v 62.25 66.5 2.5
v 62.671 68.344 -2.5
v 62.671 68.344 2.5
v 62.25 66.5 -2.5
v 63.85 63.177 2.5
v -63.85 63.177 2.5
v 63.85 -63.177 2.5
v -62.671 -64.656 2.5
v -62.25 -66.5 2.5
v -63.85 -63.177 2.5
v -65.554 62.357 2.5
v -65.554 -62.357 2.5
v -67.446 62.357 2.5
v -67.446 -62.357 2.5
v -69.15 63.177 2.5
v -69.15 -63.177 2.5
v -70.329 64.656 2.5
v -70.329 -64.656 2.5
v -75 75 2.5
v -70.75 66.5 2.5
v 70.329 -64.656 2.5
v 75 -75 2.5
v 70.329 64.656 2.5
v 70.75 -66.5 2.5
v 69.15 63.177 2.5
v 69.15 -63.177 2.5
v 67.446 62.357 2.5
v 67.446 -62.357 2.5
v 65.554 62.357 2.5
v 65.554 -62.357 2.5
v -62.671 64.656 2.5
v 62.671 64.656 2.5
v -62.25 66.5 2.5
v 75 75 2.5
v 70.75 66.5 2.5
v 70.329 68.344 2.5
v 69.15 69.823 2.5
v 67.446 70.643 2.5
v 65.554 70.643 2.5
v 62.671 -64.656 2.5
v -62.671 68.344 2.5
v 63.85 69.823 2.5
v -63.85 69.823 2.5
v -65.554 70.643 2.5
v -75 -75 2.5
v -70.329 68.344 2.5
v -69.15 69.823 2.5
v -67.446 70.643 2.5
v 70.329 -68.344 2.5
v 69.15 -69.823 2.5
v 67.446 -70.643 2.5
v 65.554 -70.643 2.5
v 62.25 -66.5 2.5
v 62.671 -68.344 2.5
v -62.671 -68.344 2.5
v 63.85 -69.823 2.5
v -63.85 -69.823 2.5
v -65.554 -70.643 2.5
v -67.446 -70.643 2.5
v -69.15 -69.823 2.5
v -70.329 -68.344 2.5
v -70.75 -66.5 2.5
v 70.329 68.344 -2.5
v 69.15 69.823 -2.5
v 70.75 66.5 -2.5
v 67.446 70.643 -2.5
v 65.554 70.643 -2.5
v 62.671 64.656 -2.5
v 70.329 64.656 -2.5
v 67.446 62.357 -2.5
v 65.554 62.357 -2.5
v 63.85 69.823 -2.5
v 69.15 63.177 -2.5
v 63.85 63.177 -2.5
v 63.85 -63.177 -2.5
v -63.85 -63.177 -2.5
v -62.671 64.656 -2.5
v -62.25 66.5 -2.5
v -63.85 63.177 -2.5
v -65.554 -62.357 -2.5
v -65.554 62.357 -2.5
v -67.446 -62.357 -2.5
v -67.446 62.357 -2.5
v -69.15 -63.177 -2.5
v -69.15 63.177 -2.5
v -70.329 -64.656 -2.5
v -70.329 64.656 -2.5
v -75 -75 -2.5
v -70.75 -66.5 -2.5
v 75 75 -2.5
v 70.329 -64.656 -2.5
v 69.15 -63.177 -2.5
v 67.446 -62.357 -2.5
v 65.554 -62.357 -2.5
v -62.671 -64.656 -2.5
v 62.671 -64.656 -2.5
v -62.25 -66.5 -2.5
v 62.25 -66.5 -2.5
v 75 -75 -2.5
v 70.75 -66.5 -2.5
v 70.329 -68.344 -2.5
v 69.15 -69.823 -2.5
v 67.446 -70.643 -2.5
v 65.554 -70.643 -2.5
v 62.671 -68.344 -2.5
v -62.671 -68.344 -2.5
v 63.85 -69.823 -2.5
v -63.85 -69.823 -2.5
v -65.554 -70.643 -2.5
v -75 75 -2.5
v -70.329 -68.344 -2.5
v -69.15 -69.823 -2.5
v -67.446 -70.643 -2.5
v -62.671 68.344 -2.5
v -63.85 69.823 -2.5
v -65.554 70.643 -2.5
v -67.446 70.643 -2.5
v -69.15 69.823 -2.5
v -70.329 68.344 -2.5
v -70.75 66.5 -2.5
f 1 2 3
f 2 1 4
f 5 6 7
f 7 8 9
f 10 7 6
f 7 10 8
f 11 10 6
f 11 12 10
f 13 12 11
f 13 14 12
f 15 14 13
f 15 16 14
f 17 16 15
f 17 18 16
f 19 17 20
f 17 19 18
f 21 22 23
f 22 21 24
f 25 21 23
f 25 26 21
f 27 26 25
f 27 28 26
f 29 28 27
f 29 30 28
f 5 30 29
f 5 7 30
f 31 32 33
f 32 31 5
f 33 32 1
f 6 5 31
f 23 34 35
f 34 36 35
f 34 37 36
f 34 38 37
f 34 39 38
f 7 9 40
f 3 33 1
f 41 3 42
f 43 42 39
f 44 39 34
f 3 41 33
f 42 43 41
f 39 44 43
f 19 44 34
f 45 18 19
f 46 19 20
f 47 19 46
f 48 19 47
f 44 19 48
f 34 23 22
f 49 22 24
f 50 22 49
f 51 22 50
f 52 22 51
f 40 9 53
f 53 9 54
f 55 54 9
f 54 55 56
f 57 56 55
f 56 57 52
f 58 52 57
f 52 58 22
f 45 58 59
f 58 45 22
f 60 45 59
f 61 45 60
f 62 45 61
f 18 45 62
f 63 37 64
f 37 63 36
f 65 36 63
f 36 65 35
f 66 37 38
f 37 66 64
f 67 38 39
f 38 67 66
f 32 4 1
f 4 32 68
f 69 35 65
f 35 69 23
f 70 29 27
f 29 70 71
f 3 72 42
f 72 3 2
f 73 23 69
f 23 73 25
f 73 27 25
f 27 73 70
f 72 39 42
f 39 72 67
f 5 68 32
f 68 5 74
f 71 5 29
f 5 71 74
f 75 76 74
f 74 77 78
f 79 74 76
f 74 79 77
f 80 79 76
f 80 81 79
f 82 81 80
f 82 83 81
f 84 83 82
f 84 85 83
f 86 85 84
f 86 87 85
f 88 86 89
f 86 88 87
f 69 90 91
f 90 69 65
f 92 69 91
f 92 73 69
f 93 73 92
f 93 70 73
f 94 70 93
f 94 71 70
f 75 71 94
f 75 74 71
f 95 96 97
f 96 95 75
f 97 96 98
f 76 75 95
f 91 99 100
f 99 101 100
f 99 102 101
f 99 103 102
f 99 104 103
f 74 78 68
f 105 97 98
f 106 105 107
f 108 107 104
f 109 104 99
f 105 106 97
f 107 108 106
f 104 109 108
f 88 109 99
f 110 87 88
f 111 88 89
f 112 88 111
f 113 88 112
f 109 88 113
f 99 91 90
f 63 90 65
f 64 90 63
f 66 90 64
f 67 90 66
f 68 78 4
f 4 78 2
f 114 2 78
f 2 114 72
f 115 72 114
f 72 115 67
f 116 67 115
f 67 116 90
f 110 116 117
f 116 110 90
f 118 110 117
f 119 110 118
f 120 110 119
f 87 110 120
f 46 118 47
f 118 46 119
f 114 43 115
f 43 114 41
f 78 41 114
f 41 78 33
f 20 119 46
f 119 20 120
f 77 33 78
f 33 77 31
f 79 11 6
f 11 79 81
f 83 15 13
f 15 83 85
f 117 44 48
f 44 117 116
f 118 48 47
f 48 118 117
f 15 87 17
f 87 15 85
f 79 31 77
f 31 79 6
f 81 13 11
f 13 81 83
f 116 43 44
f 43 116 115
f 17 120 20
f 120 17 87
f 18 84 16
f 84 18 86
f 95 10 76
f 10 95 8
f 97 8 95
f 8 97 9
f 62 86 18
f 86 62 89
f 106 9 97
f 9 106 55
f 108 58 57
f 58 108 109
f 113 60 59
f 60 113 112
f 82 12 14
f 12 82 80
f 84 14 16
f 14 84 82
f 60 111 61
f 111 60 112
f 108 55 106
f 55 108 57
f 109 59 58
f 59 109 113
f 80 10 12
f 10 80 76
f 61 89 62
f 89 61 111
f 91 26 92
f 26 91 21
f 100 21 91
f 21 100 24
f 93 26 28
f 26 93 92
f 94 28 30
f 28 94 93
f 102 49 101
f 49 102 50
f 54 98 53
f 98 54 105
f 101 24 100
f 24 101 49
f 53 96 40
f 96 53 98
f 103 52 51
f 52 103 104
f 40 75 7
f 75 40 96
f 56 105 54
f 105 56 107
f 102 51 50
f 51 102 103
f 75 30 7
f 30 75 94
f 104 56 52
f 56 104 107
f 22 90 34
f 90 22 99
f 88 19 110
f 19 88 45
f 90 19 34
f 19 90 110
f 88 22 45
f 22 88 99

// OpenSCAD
// Generated by SolidPython 1.1.3 on 2023-12-20 14:17:19


difference() {
	cube(center = true, size = [150, 150, 5]);
	union() {
		translate(v = [66.5000000000, 66.5000000000]) {
			cylinder(center = true, h = 5, r = 4.2500000000);
		}
		translate(v = [-66.5000000000, 66.5000000000]) {
			cylinder(center = true, h = 5, r = 4.2500000000);
		}
		translate(v = [-66.5000000000, -66.5000000000]) {
			cylinder(center = true, h = 5, r = 4.2500000000);
		}
		translate(v = [66.5000000000, -66.5000000000]) {
			cylinder(center = true, h = 5, r = 4.2500000000);
		}
	}
}
/***********************************************
*********      SolidPython code:      **********
************************************************
 
import solid
import numpy as np
import numbers
import pudb
from solid.utils import *
import viewscad
import subprocess
import os
import os.path as osp
import math
import sys

chamfer_extrude=solid.import_scad("./chamfer_extrude.scad")
chamfer_extrude=chamfer_extrude.chamfer_extrude
r = viewscad.Renderer(width=800, height=800)

def debug(model,f_name,path="/home/ts/code/projects/mfd/designs/debug"):
    solid.scad_render_to_file(model,osp.join(path,f_name)+".scad")
#generate position list of wells using offset from center
wells_pos_from_center_4 = lambda offset: [[-offset,offset],
                                        [offset, offset],
                                        [-offset, -offset],
                                        [offset, -offset]]
#wells_pos_from_center_2 = lambda offset: [[0,offset],
#                                        [0, -offset]]
wells_pos_from_center_2 = lambda offset: [[offset,0],
                                        [-offset,0]]

def make_well(dims,shape=None,height=None,dxf=False):
    def circle_cylinder():
        if dxf or (height is None):
            well = solid.circle(r=dims, segments=64)
        else:
            well = solid.cylinder(r=dims, h=height, segments=64, center = True)
        return well
    if dims is None:
        sys.exit("radius needs to be a number")
    if isinstance(dims, numbers.Number):
        well =circle_cylinder()
    elif len(dims)==1:
        if isinstance(dims[1], numbers.Number):
            well =circle_cylinder()
        else:
            sys.exit("radius needs to be a number")
    elif len(dims)==2:
        well = solid.square(dims,center = True)
    elif len(dims)==3:
        well = solid.cube(dims, center = True)
    return well

def wells_top_bottom(center_gap,device_dims=None,shape=None,height=None, positions = None, dxf = False,well_shape=None):
    if well_shape == None:
        well_shape = make_well(device_dims,shape=shape,height=height,dxf=dxf)
    wells = []
    if positions is None:
        offset = radius+radius/2.0
        positions = wells_pos_from_center_2(offset)
    if dxf or (height is None):
        height = 0
    for position in positions:
        if dxf:
            wells.append(solid.translate([position[0],position[1]])(well_shape))
        else:
            wells.append(solid.translate([position[0],position[1],height/2.0])(well_shape))
    return  union()(*wells)

#place wells in four corners 
def four_corner(radius,height=None, positions = None, dxf = False):
    #if well pos not specified set
    #to equally spaced by half radius
    if positions is None:
        offset = radius+radius/2.0
        positions = wells_pos_from_center_4(offset)
    if dxf or (height is None):
        height = 0
    #make wells at positions with specified radius and height
    wells = []
    for position in positions:
        #make circle if making dxf
        if dxf:
            well_shape = solid.circle(r=radius, segments=64)
            well_shape = solid.translate([position[0],position[1]])(well_shape)
        #if stl make cylinder
        else:
            well_shape = solid.cylinder(r=radius, h=height, segments=64, center = True)
            well_shape = solid.translate([position[0],position[1],height/2.0])(well_shape)
        wells.append(well_shape)
    return  union()(*wells)

#generate channels 
def make_channels(length,width,height=0,num_chans=1,max_chans=None,spacing=None, dxf = False,
                  rotate_channels=False):
    if dxf or (height is None):
        height = 0
    #if channel gap not defined, is equal to
    if spacing is None: spacing = width
    #calculate number of channels if fitting max num within given width
    if not max_chans is None:
        import math
        num_chans = math.floor((max_chans-spacing)/(width+spacing))
    #get total width of channel section  
    total_width = (width*num_chans)+(spacing*(num_chans-1))

    #make template channel
    #if rotate_channels: width, length = length, width
    if dxf:
        channel_t = solid.square([length,width],center = True)
    else:
        channel_t = solid.cube([length,width,height], center = True)

    #if number channels is even, offset the first channel to center its gap
    if num_chans % 2 == 0: centering = -(width/2.0+spacing/2.0)
    else: centering = 0
    #move template channel up to align bottom at z = 0 
    #and offset center if necessary
    if dxf:
        channel_t = solid.translate([0,centering])(channel_t)
    else:
        channel_t = solid.translate([0,centering,height/2.0])(channel_t)

    #if rotate_channels: length,width = width,length
    #start making the channels
    channels = []
    for i in range(num_chans):
        #if i=0 there is no translation
        #if i=1, we make the first channel adjacent to second
        direction = i

        #if i>=1, we add channels alternating left and right
        if i >= 1:
            direction = -(i/2.0)
            if i % 2 == 1: direction = (-direction)+0.5
                
        #make channel at right position and add it to channel list
        translation_coords = [0,direction*(width+spacing)]
        #if rotate_channels: translation_coords = [direction*(width+spacing),0]
        if dxf:
            channel = solid.translate(translation_coords)(channel_t)
        else:
            channel = solid.translate([*translation_coords,0])(channel_t)
        channels.append(channel)
    
    #group all channels as one object
    channels = union()(*channels)
    #compute the x,y,z dimensions in order to pass as arguments 
    #for construction of other parts of device (such as the chambers)
    measurements = {'x':(length/2.0,-length/2.0),
                    'y':(total_width/2.0,-total_width/2.0)}
    if not dxf:
        measurements['z'] = (height,0)
    if rotate_channels:
        channels = solid.rotate(90)(channels)
        measurements['x'],measurements['y']=measurements['y'],measurements['x']
    return channels,measurements

def make_chambers(msrs,height=None,extra=0,len_until=None,width=None, dxf = False):
    #computes x,y,z length
    total = lambda x : abs(x[0]) + abs(x[1])
    
    #if specific height if specified
    #otherwise use same height as channels
    if dxf:
        pass
    elif not height is None:
        msrs['z'] = (height,0)
    else:
        msrs['z'] = (0,0)
        
    #make copy of measurements from channels to modify chamber dimensions 
    #and add length to chambers as specified
    chamber_dims = msrs.copy()
    #calculate length of chamber to reach specified offset
    if not len_until is None:
        chamber_len = len_until-(msrs['x'][0])
    #or add specified length to channel length (if not specified, adds 0)
    else:
        chamber_len = msrs['x'][0]+extra
    #set the chamber length based 
    chamber_dims['x'] = (chamber_len/2.0,-(chamber_len/2.0))
    #compute final dimensions of chamber
    if not width is None:
        chamber_dims['y'] = (width/2.0,-width/2.0)
    chamber_dims = [total(size) for size in chamber_dims.values()]
        
    #calculate chamber translation offset to place adjacent to channels
    chamber_trslt = msrs['x'][0]+(chamber_len/2.0)
    #compute chamber translation coordinates to align with channels
    #x = 1 moves chamber above channels
    #x = -1 moves chamber below channels
    if dxf:
        trslt = lambda x : [x*(chamber_trslt),0]
    else:
        trslt = lambda x : [x*(chamber_trslt),0,msrs['z'][0]/2.0]
    
    #function to make chamber at top or at bottom 
    if dxf:
        move = lambda x : solid.translate(trslt(x))(solid.square(chamber_dims, center = True) )
    else:
        move = lambda x : solid.translate(trslt(x))(solid.cube(chamber_dims,center = True))
    #make top and bottom chambers and return them as grouped
    top = move(1)
    bottom = move(-1)
    #chambers=solid.rotate(90)(solid.union()(top,bottom))
    chambers=(solid.union()(top,bottom))

    return chambers

#create alignment features 
def alignment_features(unit,dims,grid_size, mask_size = None, alignment = "hollow", units_from_center = (2.5,2.5), corner_len=None):
    width = grid_size[0]*dims[0]
    length = grid_size[1]*dims[1]
    if mask_size is None and corner_len is None:
        corner_len = (dims[0] + dims[1]) /2 / 8
    corner = lambda thickness_div : solid.union()( solid.square([corner_len,corner_len/thickness_div],center=False), solid.square([corner_len/thickness_div,corner_len],center=False) )
    
    def make_full(thickness_div):
        thickness = corner_len/thickness_div
        tr = solid.translate([0, 0, 0 ])(solid.rotate(180)(corner(thickness_div)))
        tr = solid.translate([thickness/2,thickness/2,0])(tr)
        bl = solid.translate([0, 0, 0 ])(solid.rotate(0)(corner(thickness_div)))
        bl = solid.translate([-thickness/2,-thickness/2,0])(bl)
        return solid.union()(tr,bl)
    
    def make_hollow(thickness_div):
        thickness = corner_len/(thickness_div/2)
        inner = make_full(thickness_div)
        outer = make_full(thickness_div/2)
        hollow = outer - inner 
        return hollow
    
    center = (width /2 , length/2)
    mask_pos = lambda x,y : (center[0] + x*(float(units_from_center[0])*dims[0]), center[1] + y*(float(units_from_center[1])*dims[1]))
    positions = []
    positions.append(mask_pos(1,0))
    positions.append(mask_pos(0,1))
    positions.append(mask_pos(-1,0))
    positions.append(mask_pos(0,-1))
    make_mask = lambda mtype : make_hollow(8) if mtype == "hollow" else make_full(8)
    masks = [ solid.translate([*position,0])(make_mask(alignment)) for position in positions]
    
    solid.scad_render_to_file(solid.union()(*masks),"./designs/open_chamber/masks.scad")
    #return unit - solid.union()(*masks)
    return solid.union()(*masks,unit)

def create_outline(thickness, array, dims, grid_size,):
    width = grid_size[0]*dims[0] + thickness *2
    length = grid_size[1]*dims[1] + thickness *2
    outer = solid.translate([-thickness, -thickness,0])(solid.square([width, length]))
    return outer-array

def create_wall(wall_thickness, outline_thickness, dims, grid_size, wall_height = 2000, dxf = False):
    inner_width = grid_size[0]*dims[0] + outline_thickness *2
    inner_length = grid_size[1]*dims[1] + outline_thickness *2
    outer_width = inner_width + wall_thickness * 2
    outer_length = inner_length + wall_thickness * 2
    outer_pos_x = -outline_thickness-wall_thickness
    outer_pos_y = -outline_thickness-wall_thickness
    inner_pos_x = -outline_thickness
    inner_pos_y = -outline_thickness
    if dxf:
        inner_wall = solid.translate([inner_pos_x,
                                      inner_pos_y,
                                      0])(solid.square([inner_width, inner_length]))
        outer_wall = solid.translate([outer_pos_x,
                                      outer_pos_y,
                                      0])(solid.square([outer_width, outer_length]))

        return outer_wall-inner_wall
    else:
        inner_wall = solid.translate([inner_pos_x,
                                      inner_pos_y,
                                      0])(solid.cube([inner_width, inner_length,wall_height]))
        outer_wall = solid.translate([outer_pos_x,
                                      outer_pos_y,
                                      0])(solid.cube([outer_width, outer_length,wall_height]))

        return outer_wall-inner_wall, {'wall_height': wall_height,
                                       'wall_thickness': wall_thickness,
                                       'inner_width':inner_width,
                                       'inner_length': inner_length,
                                       'outer_width': outer_width,
                                       'outer_length': outer_length,
                                       'outer_pos_x' : outer_pos_x,
                                       'outer_pos_y' : outer_pos_y,
                                       'inner_pos_x' : inner_pos_x,
                                       'inner_pos_y' : inner_pos_y}

def create_thicker_wall(wall_thickness, outer_wall_offset, wall_dims, dims, grid_size, height_start = .2, height_end=2, dxf = False):
    addon_wall,thicker_wall_dims = create_wall(wall_thickness, outer_wall_offset, dims, grid_size, wall_height=height_end-height_start, dxf = False)
    addon_wall = solid.translate([0,0,height_start])(addon_wall)

    thicker_wall_dims['wall_height'] = height_end
    thicker_wall_dims['wall_thickness'] = wall_dims['wall_thickness'] + wall_thickness
    return addon_wall, thicker_wall_dims
 
def add_lock_to_wall(wall,wall_dims,y_offset = 0,cut_ratio=0.7,L_length=3, gap_ratio=0.05, axis="x",width_ratio=1/2):
    # Makes L shape
    def make_L(max_length,length_thickness,max_width,width_thickness,height,y_offset):
        length = solid.cube([max_length,length_thickness,height])
        width = solid.cube([width_thickness,max_width,height])
        width = solid.translate([max_length-(width_thickness),0,0])(width)
        L = solid.union()(width,length)
        debug(L,"L")
        if axis == "x":
            L = solid.rotate(-90)(L)
            L = solid.translate([0,max_length,0])(L)
        else:
            L = solid.rotate(-180)(L)
            L = solid.translate([max_length,max_width,0])(L)
        return solid.translate([0,0,y_offset])(L)
    
    lock_length = L_length
    lock_width = wall_dims['wall_thickness']*width_ratio
    lock_length_thickness = lock_width/2
    lock_width_thickness = lock_width/2
    L_lock = make_L(lock_length,lock_length_thickness,lock_width,lock_width_thickness, wall_dims['wall_height']-y_offset, y_offset)
    
    margin_space = lock_length - lock_length*(1-gap_ratio)
    key_length = lock_length-margin_space
    key_length_thickness = lock_length_thickness-(margin_space*2)
    key_width = lock_width-(margin_space*2)
    key_width_thickness = lock_width_thickness-(margin_space*2)
    L_key = make_L(key_length,key_length_thickness,key_width,key_width_thickness, wall_dims['wall_height']-y_offset, y_offset)
    L_key = solid.translate([margin_space,margin_space,0])(L_key)
    L = solid.union()(L_lock,L_key)
    debug(L,"L")
    
    #Make cube to be used as negative to split frame in a half
    #Can choose if making left or right negative, specify ratio of split
    def make_negative(right,cut_ratio):
        if axis == "x":
            if right:
                length = wall_dims['outer_length']*(1-cut_ratio)
                pos_x = wall_dims['outer_pos_x']+(wall_dims['outer_length']*cut_ratio)
            else:
                length = wall_dims['outer_length']*(cut_ratio)
                pos_x = wall_dims['outer_pos_x'] 
            negative = solid.cube([wall_dims['outer_width'],length, wall_dims['wall_height']])
            negative = solid.translate([wall_dims['outer_pos_y'],pos_x,0])(negative)
        else:
            if right:
                length = wall_dims['outer_width']*(1-cut_ratio)
                pos_x = wall_dims['outer_pos_y']+(wall_dims['outer_width']*cut_ratio)
            else:
                length = wall_dims['outer_width']*(cut_ratio)
                pos_x = wall_dims['outer_pos_y'] 
            negative = solid.cube([length,wall_dims['outer_length'], wall_dims['wall_height']])
            negative = solid.translate([pos_x,wall_dims['outer_pos_x'],0])(negative)
        return negative, pos_x, length 
                      
    #Make negatives
    negative_right, right_half_pos_x, right_half_length = make_negative(True,cut_ratio)
    negative_left, left_half_pos_x, right_half_length = make_negative(False,cut_ratio)
    #Make halves
    left_half = solid.difference()(wall,negative_right)
    right_half = solid.difference()(wall,negative_left)
    def place_L(L, L_length,L_width):
        #Place L on top wall       
        offset_to_center = (wall_dims['wall_thickness']-L_width)/2
        if axis == "x":
            y_pos_top = (wall_dims['outer_pos_y'] +
                    wall_dims['outer_width'] - 
                    L_width - offset_to_center)
            top_L = solid.translate([y_pos_top,
                                     right_half_pos_x-(L_length),
                                     0])(L)
            #Place L on bottom wall       
            y_pos_bottom = wall_dims['outer_pos_y']+offset_to_center
            bottom_L = solid.translate([y_pos_bottom,
                                        right_half_pos_x-L_length,
                                        0])(L)
        else:
            y_pos_top = (wall_dims['outer_pos_x'] +
                    wall_dims['outer_length'] -
                    (L_width+offset_to_center))
            top_L = solid.translate([right_half_pos_x-L_length,
                                     y_pos_top,
                                     0])(L)
            #Place L on bottom wall       
            y_pos_bottom = wall_dims['outer_pos_y']+offset_to_center
            bottom_L = solid.translate([right_half_pos_x-L_length,
                                        y_pos_bottom,
                                        0])(L)
        return bottom_L, top_L
    #Make complimentary L pieces through union and differences
    #Make Lock
    bottom_L_lock, top_L_lock = place_L(L_lock,L_length,lock_width)
    left_half = solid.difference()(left_half,bottom_L_lock)
    left_half = solid.difference()(left_half,top_L_lock)
    #Make Key
    bottom_L_key, top_L_key = place_L(L_key,L_length,lock_width)
    right_half = solid.union()(right_half,bottom_L_key)
    right_half = solid.union()(right_half,top_L_key)
    return left_half, right_half


#build a row x col grid of containment units
def make_unit_array(unit,dims,grid_size, dxf = False, alignment = None, mask_size = None,
                    units_from_center = None,alignment_offset=None, alignment_mark_size=1):
    units = []
    for col in range(grid_size[1]):
        for row in range(grid_size[0]):
            if dxf:
                units.append(solid.translate([row*dims[0],col*dims[1]])(unit))
            else:
                units.append(solid.translate([row*dims[0],col*dims[1],dims[2]/2.0])(unit))
    array = solid.union()(*units)
    if (not alignment is None) and dxf:
        if not alignment_offset is None:
            array = solid.translate([alignment_offset[0],alignment_offset[1]])(array)
        array = alignment_features(array,dims, grid_size, alignment = alignment, mask_size = None, units_from_center = units_from_center,corner_len=alignment_mark_size)
        if not alignment_offset is None:
            array = solid.translate([-alignment_offset[0],-alignment_offset[1]])(array)
    return array


def make_taylor(wells_pos = wells_pos_from_center_4(2.25), well_rad = 1.5 ,
                well_height = 2, chan_w = 0.01, chan_l = 1, chan_h = 0.010 ,
                chan_gap = 0.040, max_chans = None,num_chans=100, chamber_height  = 0.100,
                columns = 1, rows = 1, chamber_len_until=2.25, add_channels = True, add_wells = True, 
                add_chambers = True, save_path = "./", alignment = None, units_from_center = 2,
                mask_size = None, render_stl = False, outline_thickness = 0.050, dxf = True,
                wall_height = 15, wall_thickness = 0.95, casing_x=9, casing_y=9, casing_z=0,rotate_units=0):

    dims = [casing_x, casing_y, casing_z]
    wells = four_corner(well_rad,well_height, dxf = dxf, positions = wells_pos)
    debug(wells,"wells")
    channels, msrs = make_channels(chan_l,chan_w,chan_h,dxf=dxf, spacing = chan_gap, max_chans=max_chans,num_chans=num_chans)
    debug(channels,"channels")
    chambers = make_chambers(msrs,dxf = dxf, height=chamber_height,len_until=chamber_len_until)
    debug(chambers,"chambers")

    #add together and render
    device_parts = []
    if add_channels:
        device_parts.append(channels)
    if add_wells:
        device_parts.append(wells)
    if add_chambers:
        device_parts.append(chambers)
    device=union()(*device_parts)
    device = rotate(rotate_units)(device)

    device=solid.translate([dims[0]/2.0,dims[1]/2.0,0])(device)
    channels = rotate(rotate_units)(channels)
    channels=solid.translate([dims[0]/2,dims[1]/2,0])(channels)
    chambers_wells = union()(wells,chambers)
    chambers_wells = rotate(rotate_units)(chambers_wells)
    chambers_wells=solid.translate([dims[0]/2,dims[1]/2,0])(chambers_wells)

    file_name = str(rows)+'x'+str(columns)+'_units_'
    grid_size = [rows,columns]

    if alignment:
        alignment="full"
    device = make_unit_array(device,dims,grid_size, dxf=dxf, alignment = alignment,
                                 units_from_center = units_from_center)
    channels = make_unit_array(channels,dims,grid_size, dxf=dxf, alignment = alignment,
                                 units_from_center = units_from_center)
    if alignment=="full":
        alignment="hollow"

    chambers_wells = make_unit_array(chambers_wells,dims,grid_size, dxf=dxf, alignment = alignment,
                                 units_from_center =units_from_center)

    def save_model(model,prefix):
        model_fname = os.path.abspath(save_path+prefix+"_"+file_name+".scad")
        solid.scad_render_to_file(model,model_fname)
        return model_fname

    wells_fname = save_model(wells,"wells")
    channels_fname = save_model(channels,"channels")
    device_fname = save_model(device,"device")
    chambers_wells_fname = save_model(chambers_wells,"chambers_wells")
    return (chambers_wells,chambers_wells_fname), (channels,channels_fname), (device,device_fname)

def make_device(design='open',rows=8,columns=6,wells_pos = 4.5,well_offset=3.2, well_rad=3.2,well_height=0.1,
                chan_l=1,chan_w=0.01,chan_h=0.01,chan_gap=0.015,num_chans=101,dxf=True,save_path="./designs/open_chamber/",
                casing_x=9.0,casing_y=18.0,casing_z=0,rotate_units=90,units_from_center=(3,1),chamber_len_until=4.5,
                chamber_width=None,alignment=True, add_wells=True, add_channels=True,add_chambers=True,well_shape=None):

    dims = [casing_x, casing_y, casing_z]
    if design == "open":
        wells_pos=wells_pos_from_center_2(wells_pos)
        wells = wells_top_bottom(well_offset*2,device_dims=well_rad,height=well_height, dxf = dxf, positions = wells_pos,well_shape=well_shape)
    elif design == "closed":
        wells_pos=wells_pos_from_center_4(wells_pos)
        debug(wells,"wells")
        wells = four_corner(well_offset,well_height,device_dims=well_rad, dxf = dxf, positions = wells_pos)
    else:
        print(design+" is not a valid design.\n Choose valid design: 'open' or 'closed'")
        exit()
    wells = rotate(rotate_units)(wells)
    wells=solid.translate([dims[0]/2,dims[1]/2,0])(wells)
    debug(wells,"wells")

    channels, msrs = make_channels(chan_l,chan_w,chan_h,dxf=dxf, spacing = chan_gap, num_chans=num_chans,rotate_channels=False)
    channels = rotate(rotate_units)(channels)
    channels=solid.translate([dims[0]/2,dims[1]/2,0])(channels)

    chambers=make_chambers(msrs,height=None,extra=0,len_until=chamber_len_until, width=chamber_width,dxf = dxf)
    chambers = rotate(rotate_units)(chambers)
    chambers=solid.translate([dims[0]/2,dims[1]/2,0])(chambers)

    device_parts = []
    if add_channels:
        device_parts.append(channels)
    if add_wells:
        device_parts.append(wells)
    if add_chambers:
        device_parts.append(chambers)
    device = union()(*device_parts)
    #device = rotate(rotate_units)(device)
    #device=solid.translate([dims[0]/2.0,dims[1]/2.0,0])(device)

    chambers_wells = []
    if add_chambers:
        chambers_wells.append(chambers)
    if add_wells:
        chambers_wells.append(wells)
    chambers_wells = union()(*chambers_wells)
    #chambers_wells = union()(wells,chambers)
    #chambers_wells = rotate(rotate_units)(chambers_wells)
    #chambers_wells=solid.translate([dims[0]/2,dims[1]/2,0])(chambers_wells)

    file_name = str(rows)+'x'+str(columns)+'_units_'

    grid_size = [rows,columns]
    if alignment:
        alignment="full"
    device = make_unit_array(device,dims,grid_size, dxf=dxf, alignment = alignment,
                                 units_from_center = units_from_center)
    channels = make_unit_array(channels,dims,grid_size, dxf=dxf, alignment = alignment,
                                 units_from_center = units_from_center)
    if alignment=="full":
        alignment="hollow"

    chambers_wells = make_unit_array(chambers_wells,dims,grid_size, dxf=dxf, alignment = alignment,
                                 units_from_center =units_from_center)

    def save_model(model,prefix):
        model_fname = os.path.abspath(save_path+prefix+"_"+file_name+".scad")
        solid.scad_render_to_file(model,model_fname)
        return model_fname

    wells_fname = save_model(wells,"wells")
    channels_fname = save_model(channels,"channels")
    device_fname = save_model(device,"device")
    chambers_wells_fname = save_model(chambers_wells,"chambers_wells")
    return (chambers_wells,chambers_wells_fname), (channels,channels_fname), (device,device_fname)


def make_open_chamber(rows=8,columns=6,wells_pos = wells_pos_from_center_2(4.5), well_rad=3.2,well_height=0.1,
                      chan_l=1,chan_w=0.01,chan_h=0.01,chan_gap=0.015,num_chans=101,dxf=True,save_path="./designs/open_chamber/",
                      casing_x=9.0,casing_y=18.0,casing_z=0,rotate_units=90,units_from_center=(3,1),chamber_len_until=4.5,
                      chamber_width=None,alignment=True, add_wells=True, add_channels=True,add_chambers=True,well_shape=None):

    dims = [casing_x, casing_y, casing_z]
    wells = wells_top_bottom(well_rad,height=well_height, dxf = dxf, positions = wells_pos, well_shape=well_shape)
    channels, msrs = make_channels(chan_l,chan_w,chan_h,dxf=dxf, spacing = chan_gap, num_chans=num_chans,rotate_channels=False)
    chambers=make_chambers(msrs,height=None,extra=0,len_until=chamber_len_until, width=chamber_width,dxf = dxf)
    debug(chambers,"chambers")
    device_parts = []
    if add_channels:
        device_parts.append(channels)
    if add_wells:
        device_parts.append(wells)
    if add_chambers:
        device_parts.append(chambers)
    device = union()(*device_parts)
    device = rotate(rotate_units)(device)
    device=solid.translate([dims[0]/2.0,dims[1]/2.0,0])(device)
    channels = rotate(rotate_units)(channels)
    channels=solid.translate([dims[0]/2,dims[1]/2,0])(channels)
    chambers_wells = union()(wells,chambers)
    chambers_wells = rotate(rotate_units)(chambers_wells)
    chambers_wells=solid.translate([dims[0]/2,dims[1]/2,0])(chambers_wells)

    file_name = str(rows)+'x'+str(columns)+'_units_'

    grid_size = [rows,columns]
    if alignment:
        alignment="full"
    device = make_unit_array(device,dims,grid_size, dxf=dxf, alignment = alignment,
                                 units_from_center = units_from_center)
    channels = make_unit_array(channels,dims,grid_size, dxf=dxf, alignment = alignment,
                                 units_from_center = units_from_center)
    if alignment=="full":
        alignment="hollow"

    chambers_wells = make_unit_array(chambers_wells,dims,grid_size, dxf=dxf, alignment = alignment,
                                 units_from_center =units_from_center)

    def save_model(model,prefix):
        model_fname = os.path.abspath(save_path+prefix+"_"+file_name+".scad")
        solid.scad_render_to_file(model,model_fname)
        return model_fname

    wells_fname = save_model(wells,"wells")
    channels_fname = save_model(channels,"channels")
    device_fname = save_model(device,"device")
    chambers_wells_fname = save_model(chambers_wells,"chambers_wells")
    return (chambers_wells,chambers_wells_fname), (channels,channels_fname), (device,device_fname)

def to_dxf(scad_path):
    dxf_path = scad_path.replace(".scad",".dxf")
    subprocess.call(["openscad", "-o", dxf_path, scad_path])
    import ezdxf
    temp_dxf = ezdxf.readfile(dxf_path)
    temp_dxf.saveas(dxf_path)

#def make_walls(diameter,thickness,grid_size,dims,height=20,segments=256,make_inner=True):
#    wafer_wall_out = solid.cylinder(r=diameter/2,h=height, segments=segments)
#    wafer_wall_in = solid.cylinder(r=(diameter/2-thickness),h=height, segments=segments)
#    wafer_wall = solid.difference()(wafer_wall_out,wafer_wall_in)
#    wafer_wall = solid.translate([grid_size[1]*dims[1]/2.0,grid_size[0]*dims[0]/2.0])(wafer_wall)
#
#    vertical_wall_length = grid_size[1]*dims[1]
#    horizontal_wall_length = grid_size[0]*dims[0]
#    vertical_wall = solid.cube([vertical_wall_length,thickness,height],center = True)
#    vertical_wall = solid.translate([vertical_wall_length/2,0,height/2])(vertical_wall)
#    horizontal_wall = solid.cube([thickness,horizontal_wall_length,height],center = True)
#    horizontal_wall = solid.translate([0,vertical_wall_length/2,height/2])(horizontal_wall)
#    walls = []
#    walls.append(horizontal_wall)
#    walls.append(vertical_wall)
#    for col in range(grid_size[1]):
#        if col == grid_size[1]-1: 
#            walls.append(solid.translate([0,(col+1)*dims[1]])(vertical_wall))
#        elif col > 0 and col < grid_size[1]-1 and make_inner==True:
#            walls.append(solid.translate([0,(col+1)*dims[1]])(vertical_wall))
#    for row in range(grid_size[0]):
#        if row == grid_size[0]-1: 
#            walls.append(solid.translate([(row+1)*dims[0],0])(horizontal_wall))
#        elif row > 0 and row < grid_size[0]-1 and make_inner==True:
#            walls.append(solid.translate([(row+1)*dims[0],0])(horizontal_wall))
#    walls = union()(*walls)
#    wafer_walls = union()(walls,wafer_wall)
#    return walls,wafer_wall,wafer_walls

def make_walls(diameter,thickness,grid_size,dims,height=20,segments=256,make_inner=True,padx=0,pady=0):
    wafer_wall_out = solid.cylinder(r=diameter/2,h=height, segments=segments)
    wafer_wall_in = solid.cylinder(r=(diameter/2-thickness),h=height, segments=segments)
    wafer_wall = solid.difference()(wafer_wall_out,wafer_wall_in)
    wafer_wall = solid.translate([grid_size[1]*dims[1]/2.0,grid_size[0]*dims[0]/2.0])(wafer_wall)

    vertical_wall_length = grid_size[0]*dims[0]+padx
    horizontal_wall_length = grid_size[1]*dims[1]+pady
    vertical_wall = solid.cube([vertical_wall_length,thickness,height],center = True)
    vertical_wall = solid.translate([vertical_wall_length/2-pady/2,-padx/2,height/2])(vertical_wall)
    horizontal_wall = solid.cube([thickness,horizontal_wall_length,height],center = True)
    horizontal_wall = solid.translate([-pady/2,horizontal_wall_length/2-padx/2,height/2])(horizontal_wall)
    walls = []
    walls.append(horizontal_wall)
    walls.append(vertical_wall)
    for col in range(grid_size[1]):
        if col == grid_size[1]-1: 
            walls.append(solid.translate([0,(col+1)*dims[1]+pady])(vertical_wall))
        elif col > 0 and col < grid_size[1]-1 and make_inner==True:
            walls.append(solid.translate([0,(col+1)*dims[1]])(vertical_wall))
    for row in range(grid_size[0]):
        if row == grid_size[0]-1: 
            walls.append(solid.translate([(row+1)*dims[0]+padx,0])(horizontal_wall))
        elif row > 0 and row < grid_size[0]-1 and make_inner==True:
            walls.append(solid.translate([(row+1)*dims[0],0])(horizontal_wall))
    walls = union()(*walls)
    wafer_walls = union()(walls,wafer_wall)
    return walls,wafer_wall,wafer_walls

def save_model(model,base_path,base_name,dxf=True):
    if not os.path.exists(base_path):
        os.makedirs(base_path)
    dxf_path=osp.join(base_path,base_name+".scad")
    solid.scad_render_to_file(model,osp.join(dxf_path))
    if dxf:
        to_dxf(dxf_path)

def make_wafer(diameter,flat_len,thickness):
    wafer = solid.cylinder(r1=diameter/2,r2=diameter/2,h=thickness,segments=512,)()
    x_start_flat=(flat_len/2)
    y_start_flat = math.sqrt(((diameter/2)**2) - (x_start_flat**2) )
    height_delete_flat=diameter/2-y_start_flat
    flat_delete = solid.cube([flat_len,height_delete_flat,thickness],center=False)()
    flat_delete = solid.translate([-flat_len/2,y_start_flat,0])(flat_delete)
    wafer = solid.difference()(wafer,flat_delete)
    wafer = solid.rotate(90)(wafer)
    return wafer

def add_wafer_to_mask(wafer_size,flat_len,mask,grid_size,dims,wafer_line_thickness=0.1,outer_mask_thickness=5,alignment_offset=None):
    def make_wafer_mask(wafer_size,flat_len):
        wafer_mask = make_wafer(wafer_size,flat_len,1)
        wafer_mask = solid.projection()(wafer_mask)
        wafer_mask = solid.translate([grid_size[0]*dims[0]/2.0,grid_size[1]*dims[1]/2.0])(wafer_mask)
        if not alignment_offset is None:
            wafer_mask = solid.translate([-alignment_offset[0],-alignment_offset[1]])(wafer_mask)
        return wafer_mask

    inner_wafer_line_mask = make_wafer_mask(wafer_size-wafer_line_thickness/2,flat_len)
    outer_wafer_line_mask = make_wafer_mask(wafer_size+wafer_line_thickness/2,flat_len)
    outer_wafer_mask = make_wafer_mask(wafer_size+outer_mask_thickness,flat_len)
    outer_wafer_mask = solid.difference()(outer_wafer_mask,outer_wafer_line_mask)
    wafer_mask = solid.union()(outer_wafer_mask,inner_wafer_line_mask)

    return solid.difference()(wafer_mask,mask)

def make_posts(post_shape,post_height):
    posts = solid.linear_extrude(height=post_height)(post_shape)
    return posts

def make_wafer_empty(diameter,flat_len,thickness,margin,notch_len=20,notch_height=5,oversize=1.01):
    diameter*=oversize
    flat_len*=oversize
    wafer = make_wafer(diameter,flat_len,thickness)
    holder = solid.cylinder(r1=diameter/2+margin,r2=diameter/2+margin,h=thickness,segments=512)()
    holder = solid.difference()(holder,wafer)

    x_start_flat=(flat_len/2)
    y_start_flat = math.sqrt(((diameter/2)**2) - (x_start_flat**2) )
    height_delete_flat=diameter/2-y_start_flat
    notch = solid.cube([notch_len,notch_height,thickness],center=False)()
    notch = solid.translate([-notch_len/2,y_start_flat,0])(notch)
    notch = solid.rotate(90)(notch)
    return solid.difference()(holder,notch)

def wafer_print_calibration(diameter,thickness,height,z_offset):
    circles = []
    radii = []
    radii.append(diameter/2.0*0.8)
    radii.append(diameter/2.0*0.6)
    radii.append(diameter/2.0*0.4)
    radii.append(diameter/2.0*0.2)
    for radius in radii:
        inner = solid.cylinder(r1=radius-(thickness/2.0),r2=radius-(thickness/2.0),h=thickness,segments=512,)()
        outer = solid.cylinder(r1=radius+(thickness/2.0),r2=radius+(thickness/2.0),h=thickness,segments=512,)()
        diff = solid.difference()(outer,inner)
        circles.append(diff)
    circles = solid.union()(*circles)
    circles = solid.translate([0,0,z_offset])(circles)
    return circles

def make_rack(wells,dims,grid_size,alignment_offset,rack_x,rack_y,rack_thickness,bolt_width,add_bolts=True):

    #get X and Y dimensions of gride of pipette tips
    X_len = dims[0]*grid_size[0]
    Y_len = dims[1]*grid_size[1]
    #make rack
    rack = solid.cube([rack_x,rack_y,rack_thickness],center=True)

    if add_bolts:
    #add bolt holes
        bolt_hole=solid.cylinder(r=bolt_width/2,h=rack_thickness,center=True)()
        bolt_holes = []
        bolt_holes.append(solid.translate([rack_x/2-1.5*bolt_width,rack_y/2-1.5*bolt_width])(bolt_hole))
        bolt_holes.append(solid.translate([-rack_x/2+1.5*bolt_width,rack_y/2-1.5*bolt_width])(bolt_hole))
        bolt_holes.append(solid.translate([-rack_x/2+1.5*bolt_width,-rack_y/2+1.5*bolt_width])(bolt_hole))
        bolt_holes.append(solid.translate([rack_x/2-1.5*bolt_width,-rack_y/2+1.5*bolt_width])(bolt_hole))
        bolt_holes = solid.union()(*bolt_holes)
        rack=solid.difference()(rack,bolt_holes)
    rack_support = rack

    #center rack with pipette holes
    rack = solid.translate([0,0,rack_thickness/2])(rack)
    rack = solid.translate([X_len/2,Y_len/2])(rack)
    rack = solid.translate([-alignment_offset[0],-alignment_offset[1]])(rack)
    wells = solid.linear_extrude(height=rack_thickness)(wells)
    rack = solid.difference()(rack,wells)
    return rack, rack_support

def make_pillar(wells,dims,grid_size,alignment_offset,rack_x,rack_y,pillar_height,rack_thickness,bolt_width,add_bolts=True,taper_angle=1,bolt_position_corner=1.5):

    #get X and Y dimensions of gride of pipette tips
    X_len = dims[0]*grid_size[0]
    Y_len = dims[1]*grid_size[1]
    #make rack
    rack = solid.cube([rack_x,rack_y,rack_thickness],center=True)
    
    if add_bolts:
    #add bolt holes
        bolt_hole=solid.cylinder(r=bolt_width/2,h=rack_thickness,center=True)()
        bolt_holes = []
        bolt_holes.append(solid.translate([rack_x/2-bolt_position_corner*bolt_width,rack_y/2-bolt_position_corner*bolt_width])(bolt_hole))
        bolt_holes.append(solid.translate([-rack_x/2+bolt_position_corner*bolt_width,rack_y/2-bolt_position_corner*bolt_width])(bolt_hole))
        bolt_holes.append(solid.translate([-rack_x/2+bolt_position_corner*bolt_width,-rack_y/2+bolt_position_corner*bolt_width])(bolt_hole))
        bolt_holes.append(solid.translate([rack_x/2-bolt_position_corner*bolt_width,-rack_y/2+bolt_position_corner*bolt_width])(bolt_hole))
        bolt_holes = solid.union()(*bolt_holes)
        rack=solid.difference()(rack,bolt_holes)
    rack_support = rack

    #center rack with pipette holes
    #rack = solid.translate([0,0,-rack_thickness])(rack)
    rack = solid.translate([X_len/2,Y_len/2])(rack)
    rack = solid.translate([-alignment_offset[0],-alignment_offset[1]])(rack)
    if not taper_angle == 0:
        wells=chamfer_extrude(pillar_height,taper_angle,segments=20)(wells)
    else:
        wells = solid.linear_extrude(height=pillar_height)(wells)
    rack = solid.union()(rack,wells)
    return rack, rack_support

def deg_taper_len(height,deg):
    if not deg == 0:
        return height*math.tan(math.radians(deg))
    else:
        return 0

def make_outline(inner_dims,wall_thickness,grid_size,dims,alignment_offset):
    inner_dims=np.array(inner_dims)
    inner_outline=solid.square(inner_dims,center=True)
    outer_dims=inner_dims+wall_thickness
    outer_outline=solid.square(outer_dims,center=True)
    outline=solid.difference()(outer_outline,inner_outline)
    outline=solid.translate([grid_size[0]*dims[0]/2.0,grid_size[1]*dims[1]/2.0])(outline)
    return outline








 
 
************************************************/
